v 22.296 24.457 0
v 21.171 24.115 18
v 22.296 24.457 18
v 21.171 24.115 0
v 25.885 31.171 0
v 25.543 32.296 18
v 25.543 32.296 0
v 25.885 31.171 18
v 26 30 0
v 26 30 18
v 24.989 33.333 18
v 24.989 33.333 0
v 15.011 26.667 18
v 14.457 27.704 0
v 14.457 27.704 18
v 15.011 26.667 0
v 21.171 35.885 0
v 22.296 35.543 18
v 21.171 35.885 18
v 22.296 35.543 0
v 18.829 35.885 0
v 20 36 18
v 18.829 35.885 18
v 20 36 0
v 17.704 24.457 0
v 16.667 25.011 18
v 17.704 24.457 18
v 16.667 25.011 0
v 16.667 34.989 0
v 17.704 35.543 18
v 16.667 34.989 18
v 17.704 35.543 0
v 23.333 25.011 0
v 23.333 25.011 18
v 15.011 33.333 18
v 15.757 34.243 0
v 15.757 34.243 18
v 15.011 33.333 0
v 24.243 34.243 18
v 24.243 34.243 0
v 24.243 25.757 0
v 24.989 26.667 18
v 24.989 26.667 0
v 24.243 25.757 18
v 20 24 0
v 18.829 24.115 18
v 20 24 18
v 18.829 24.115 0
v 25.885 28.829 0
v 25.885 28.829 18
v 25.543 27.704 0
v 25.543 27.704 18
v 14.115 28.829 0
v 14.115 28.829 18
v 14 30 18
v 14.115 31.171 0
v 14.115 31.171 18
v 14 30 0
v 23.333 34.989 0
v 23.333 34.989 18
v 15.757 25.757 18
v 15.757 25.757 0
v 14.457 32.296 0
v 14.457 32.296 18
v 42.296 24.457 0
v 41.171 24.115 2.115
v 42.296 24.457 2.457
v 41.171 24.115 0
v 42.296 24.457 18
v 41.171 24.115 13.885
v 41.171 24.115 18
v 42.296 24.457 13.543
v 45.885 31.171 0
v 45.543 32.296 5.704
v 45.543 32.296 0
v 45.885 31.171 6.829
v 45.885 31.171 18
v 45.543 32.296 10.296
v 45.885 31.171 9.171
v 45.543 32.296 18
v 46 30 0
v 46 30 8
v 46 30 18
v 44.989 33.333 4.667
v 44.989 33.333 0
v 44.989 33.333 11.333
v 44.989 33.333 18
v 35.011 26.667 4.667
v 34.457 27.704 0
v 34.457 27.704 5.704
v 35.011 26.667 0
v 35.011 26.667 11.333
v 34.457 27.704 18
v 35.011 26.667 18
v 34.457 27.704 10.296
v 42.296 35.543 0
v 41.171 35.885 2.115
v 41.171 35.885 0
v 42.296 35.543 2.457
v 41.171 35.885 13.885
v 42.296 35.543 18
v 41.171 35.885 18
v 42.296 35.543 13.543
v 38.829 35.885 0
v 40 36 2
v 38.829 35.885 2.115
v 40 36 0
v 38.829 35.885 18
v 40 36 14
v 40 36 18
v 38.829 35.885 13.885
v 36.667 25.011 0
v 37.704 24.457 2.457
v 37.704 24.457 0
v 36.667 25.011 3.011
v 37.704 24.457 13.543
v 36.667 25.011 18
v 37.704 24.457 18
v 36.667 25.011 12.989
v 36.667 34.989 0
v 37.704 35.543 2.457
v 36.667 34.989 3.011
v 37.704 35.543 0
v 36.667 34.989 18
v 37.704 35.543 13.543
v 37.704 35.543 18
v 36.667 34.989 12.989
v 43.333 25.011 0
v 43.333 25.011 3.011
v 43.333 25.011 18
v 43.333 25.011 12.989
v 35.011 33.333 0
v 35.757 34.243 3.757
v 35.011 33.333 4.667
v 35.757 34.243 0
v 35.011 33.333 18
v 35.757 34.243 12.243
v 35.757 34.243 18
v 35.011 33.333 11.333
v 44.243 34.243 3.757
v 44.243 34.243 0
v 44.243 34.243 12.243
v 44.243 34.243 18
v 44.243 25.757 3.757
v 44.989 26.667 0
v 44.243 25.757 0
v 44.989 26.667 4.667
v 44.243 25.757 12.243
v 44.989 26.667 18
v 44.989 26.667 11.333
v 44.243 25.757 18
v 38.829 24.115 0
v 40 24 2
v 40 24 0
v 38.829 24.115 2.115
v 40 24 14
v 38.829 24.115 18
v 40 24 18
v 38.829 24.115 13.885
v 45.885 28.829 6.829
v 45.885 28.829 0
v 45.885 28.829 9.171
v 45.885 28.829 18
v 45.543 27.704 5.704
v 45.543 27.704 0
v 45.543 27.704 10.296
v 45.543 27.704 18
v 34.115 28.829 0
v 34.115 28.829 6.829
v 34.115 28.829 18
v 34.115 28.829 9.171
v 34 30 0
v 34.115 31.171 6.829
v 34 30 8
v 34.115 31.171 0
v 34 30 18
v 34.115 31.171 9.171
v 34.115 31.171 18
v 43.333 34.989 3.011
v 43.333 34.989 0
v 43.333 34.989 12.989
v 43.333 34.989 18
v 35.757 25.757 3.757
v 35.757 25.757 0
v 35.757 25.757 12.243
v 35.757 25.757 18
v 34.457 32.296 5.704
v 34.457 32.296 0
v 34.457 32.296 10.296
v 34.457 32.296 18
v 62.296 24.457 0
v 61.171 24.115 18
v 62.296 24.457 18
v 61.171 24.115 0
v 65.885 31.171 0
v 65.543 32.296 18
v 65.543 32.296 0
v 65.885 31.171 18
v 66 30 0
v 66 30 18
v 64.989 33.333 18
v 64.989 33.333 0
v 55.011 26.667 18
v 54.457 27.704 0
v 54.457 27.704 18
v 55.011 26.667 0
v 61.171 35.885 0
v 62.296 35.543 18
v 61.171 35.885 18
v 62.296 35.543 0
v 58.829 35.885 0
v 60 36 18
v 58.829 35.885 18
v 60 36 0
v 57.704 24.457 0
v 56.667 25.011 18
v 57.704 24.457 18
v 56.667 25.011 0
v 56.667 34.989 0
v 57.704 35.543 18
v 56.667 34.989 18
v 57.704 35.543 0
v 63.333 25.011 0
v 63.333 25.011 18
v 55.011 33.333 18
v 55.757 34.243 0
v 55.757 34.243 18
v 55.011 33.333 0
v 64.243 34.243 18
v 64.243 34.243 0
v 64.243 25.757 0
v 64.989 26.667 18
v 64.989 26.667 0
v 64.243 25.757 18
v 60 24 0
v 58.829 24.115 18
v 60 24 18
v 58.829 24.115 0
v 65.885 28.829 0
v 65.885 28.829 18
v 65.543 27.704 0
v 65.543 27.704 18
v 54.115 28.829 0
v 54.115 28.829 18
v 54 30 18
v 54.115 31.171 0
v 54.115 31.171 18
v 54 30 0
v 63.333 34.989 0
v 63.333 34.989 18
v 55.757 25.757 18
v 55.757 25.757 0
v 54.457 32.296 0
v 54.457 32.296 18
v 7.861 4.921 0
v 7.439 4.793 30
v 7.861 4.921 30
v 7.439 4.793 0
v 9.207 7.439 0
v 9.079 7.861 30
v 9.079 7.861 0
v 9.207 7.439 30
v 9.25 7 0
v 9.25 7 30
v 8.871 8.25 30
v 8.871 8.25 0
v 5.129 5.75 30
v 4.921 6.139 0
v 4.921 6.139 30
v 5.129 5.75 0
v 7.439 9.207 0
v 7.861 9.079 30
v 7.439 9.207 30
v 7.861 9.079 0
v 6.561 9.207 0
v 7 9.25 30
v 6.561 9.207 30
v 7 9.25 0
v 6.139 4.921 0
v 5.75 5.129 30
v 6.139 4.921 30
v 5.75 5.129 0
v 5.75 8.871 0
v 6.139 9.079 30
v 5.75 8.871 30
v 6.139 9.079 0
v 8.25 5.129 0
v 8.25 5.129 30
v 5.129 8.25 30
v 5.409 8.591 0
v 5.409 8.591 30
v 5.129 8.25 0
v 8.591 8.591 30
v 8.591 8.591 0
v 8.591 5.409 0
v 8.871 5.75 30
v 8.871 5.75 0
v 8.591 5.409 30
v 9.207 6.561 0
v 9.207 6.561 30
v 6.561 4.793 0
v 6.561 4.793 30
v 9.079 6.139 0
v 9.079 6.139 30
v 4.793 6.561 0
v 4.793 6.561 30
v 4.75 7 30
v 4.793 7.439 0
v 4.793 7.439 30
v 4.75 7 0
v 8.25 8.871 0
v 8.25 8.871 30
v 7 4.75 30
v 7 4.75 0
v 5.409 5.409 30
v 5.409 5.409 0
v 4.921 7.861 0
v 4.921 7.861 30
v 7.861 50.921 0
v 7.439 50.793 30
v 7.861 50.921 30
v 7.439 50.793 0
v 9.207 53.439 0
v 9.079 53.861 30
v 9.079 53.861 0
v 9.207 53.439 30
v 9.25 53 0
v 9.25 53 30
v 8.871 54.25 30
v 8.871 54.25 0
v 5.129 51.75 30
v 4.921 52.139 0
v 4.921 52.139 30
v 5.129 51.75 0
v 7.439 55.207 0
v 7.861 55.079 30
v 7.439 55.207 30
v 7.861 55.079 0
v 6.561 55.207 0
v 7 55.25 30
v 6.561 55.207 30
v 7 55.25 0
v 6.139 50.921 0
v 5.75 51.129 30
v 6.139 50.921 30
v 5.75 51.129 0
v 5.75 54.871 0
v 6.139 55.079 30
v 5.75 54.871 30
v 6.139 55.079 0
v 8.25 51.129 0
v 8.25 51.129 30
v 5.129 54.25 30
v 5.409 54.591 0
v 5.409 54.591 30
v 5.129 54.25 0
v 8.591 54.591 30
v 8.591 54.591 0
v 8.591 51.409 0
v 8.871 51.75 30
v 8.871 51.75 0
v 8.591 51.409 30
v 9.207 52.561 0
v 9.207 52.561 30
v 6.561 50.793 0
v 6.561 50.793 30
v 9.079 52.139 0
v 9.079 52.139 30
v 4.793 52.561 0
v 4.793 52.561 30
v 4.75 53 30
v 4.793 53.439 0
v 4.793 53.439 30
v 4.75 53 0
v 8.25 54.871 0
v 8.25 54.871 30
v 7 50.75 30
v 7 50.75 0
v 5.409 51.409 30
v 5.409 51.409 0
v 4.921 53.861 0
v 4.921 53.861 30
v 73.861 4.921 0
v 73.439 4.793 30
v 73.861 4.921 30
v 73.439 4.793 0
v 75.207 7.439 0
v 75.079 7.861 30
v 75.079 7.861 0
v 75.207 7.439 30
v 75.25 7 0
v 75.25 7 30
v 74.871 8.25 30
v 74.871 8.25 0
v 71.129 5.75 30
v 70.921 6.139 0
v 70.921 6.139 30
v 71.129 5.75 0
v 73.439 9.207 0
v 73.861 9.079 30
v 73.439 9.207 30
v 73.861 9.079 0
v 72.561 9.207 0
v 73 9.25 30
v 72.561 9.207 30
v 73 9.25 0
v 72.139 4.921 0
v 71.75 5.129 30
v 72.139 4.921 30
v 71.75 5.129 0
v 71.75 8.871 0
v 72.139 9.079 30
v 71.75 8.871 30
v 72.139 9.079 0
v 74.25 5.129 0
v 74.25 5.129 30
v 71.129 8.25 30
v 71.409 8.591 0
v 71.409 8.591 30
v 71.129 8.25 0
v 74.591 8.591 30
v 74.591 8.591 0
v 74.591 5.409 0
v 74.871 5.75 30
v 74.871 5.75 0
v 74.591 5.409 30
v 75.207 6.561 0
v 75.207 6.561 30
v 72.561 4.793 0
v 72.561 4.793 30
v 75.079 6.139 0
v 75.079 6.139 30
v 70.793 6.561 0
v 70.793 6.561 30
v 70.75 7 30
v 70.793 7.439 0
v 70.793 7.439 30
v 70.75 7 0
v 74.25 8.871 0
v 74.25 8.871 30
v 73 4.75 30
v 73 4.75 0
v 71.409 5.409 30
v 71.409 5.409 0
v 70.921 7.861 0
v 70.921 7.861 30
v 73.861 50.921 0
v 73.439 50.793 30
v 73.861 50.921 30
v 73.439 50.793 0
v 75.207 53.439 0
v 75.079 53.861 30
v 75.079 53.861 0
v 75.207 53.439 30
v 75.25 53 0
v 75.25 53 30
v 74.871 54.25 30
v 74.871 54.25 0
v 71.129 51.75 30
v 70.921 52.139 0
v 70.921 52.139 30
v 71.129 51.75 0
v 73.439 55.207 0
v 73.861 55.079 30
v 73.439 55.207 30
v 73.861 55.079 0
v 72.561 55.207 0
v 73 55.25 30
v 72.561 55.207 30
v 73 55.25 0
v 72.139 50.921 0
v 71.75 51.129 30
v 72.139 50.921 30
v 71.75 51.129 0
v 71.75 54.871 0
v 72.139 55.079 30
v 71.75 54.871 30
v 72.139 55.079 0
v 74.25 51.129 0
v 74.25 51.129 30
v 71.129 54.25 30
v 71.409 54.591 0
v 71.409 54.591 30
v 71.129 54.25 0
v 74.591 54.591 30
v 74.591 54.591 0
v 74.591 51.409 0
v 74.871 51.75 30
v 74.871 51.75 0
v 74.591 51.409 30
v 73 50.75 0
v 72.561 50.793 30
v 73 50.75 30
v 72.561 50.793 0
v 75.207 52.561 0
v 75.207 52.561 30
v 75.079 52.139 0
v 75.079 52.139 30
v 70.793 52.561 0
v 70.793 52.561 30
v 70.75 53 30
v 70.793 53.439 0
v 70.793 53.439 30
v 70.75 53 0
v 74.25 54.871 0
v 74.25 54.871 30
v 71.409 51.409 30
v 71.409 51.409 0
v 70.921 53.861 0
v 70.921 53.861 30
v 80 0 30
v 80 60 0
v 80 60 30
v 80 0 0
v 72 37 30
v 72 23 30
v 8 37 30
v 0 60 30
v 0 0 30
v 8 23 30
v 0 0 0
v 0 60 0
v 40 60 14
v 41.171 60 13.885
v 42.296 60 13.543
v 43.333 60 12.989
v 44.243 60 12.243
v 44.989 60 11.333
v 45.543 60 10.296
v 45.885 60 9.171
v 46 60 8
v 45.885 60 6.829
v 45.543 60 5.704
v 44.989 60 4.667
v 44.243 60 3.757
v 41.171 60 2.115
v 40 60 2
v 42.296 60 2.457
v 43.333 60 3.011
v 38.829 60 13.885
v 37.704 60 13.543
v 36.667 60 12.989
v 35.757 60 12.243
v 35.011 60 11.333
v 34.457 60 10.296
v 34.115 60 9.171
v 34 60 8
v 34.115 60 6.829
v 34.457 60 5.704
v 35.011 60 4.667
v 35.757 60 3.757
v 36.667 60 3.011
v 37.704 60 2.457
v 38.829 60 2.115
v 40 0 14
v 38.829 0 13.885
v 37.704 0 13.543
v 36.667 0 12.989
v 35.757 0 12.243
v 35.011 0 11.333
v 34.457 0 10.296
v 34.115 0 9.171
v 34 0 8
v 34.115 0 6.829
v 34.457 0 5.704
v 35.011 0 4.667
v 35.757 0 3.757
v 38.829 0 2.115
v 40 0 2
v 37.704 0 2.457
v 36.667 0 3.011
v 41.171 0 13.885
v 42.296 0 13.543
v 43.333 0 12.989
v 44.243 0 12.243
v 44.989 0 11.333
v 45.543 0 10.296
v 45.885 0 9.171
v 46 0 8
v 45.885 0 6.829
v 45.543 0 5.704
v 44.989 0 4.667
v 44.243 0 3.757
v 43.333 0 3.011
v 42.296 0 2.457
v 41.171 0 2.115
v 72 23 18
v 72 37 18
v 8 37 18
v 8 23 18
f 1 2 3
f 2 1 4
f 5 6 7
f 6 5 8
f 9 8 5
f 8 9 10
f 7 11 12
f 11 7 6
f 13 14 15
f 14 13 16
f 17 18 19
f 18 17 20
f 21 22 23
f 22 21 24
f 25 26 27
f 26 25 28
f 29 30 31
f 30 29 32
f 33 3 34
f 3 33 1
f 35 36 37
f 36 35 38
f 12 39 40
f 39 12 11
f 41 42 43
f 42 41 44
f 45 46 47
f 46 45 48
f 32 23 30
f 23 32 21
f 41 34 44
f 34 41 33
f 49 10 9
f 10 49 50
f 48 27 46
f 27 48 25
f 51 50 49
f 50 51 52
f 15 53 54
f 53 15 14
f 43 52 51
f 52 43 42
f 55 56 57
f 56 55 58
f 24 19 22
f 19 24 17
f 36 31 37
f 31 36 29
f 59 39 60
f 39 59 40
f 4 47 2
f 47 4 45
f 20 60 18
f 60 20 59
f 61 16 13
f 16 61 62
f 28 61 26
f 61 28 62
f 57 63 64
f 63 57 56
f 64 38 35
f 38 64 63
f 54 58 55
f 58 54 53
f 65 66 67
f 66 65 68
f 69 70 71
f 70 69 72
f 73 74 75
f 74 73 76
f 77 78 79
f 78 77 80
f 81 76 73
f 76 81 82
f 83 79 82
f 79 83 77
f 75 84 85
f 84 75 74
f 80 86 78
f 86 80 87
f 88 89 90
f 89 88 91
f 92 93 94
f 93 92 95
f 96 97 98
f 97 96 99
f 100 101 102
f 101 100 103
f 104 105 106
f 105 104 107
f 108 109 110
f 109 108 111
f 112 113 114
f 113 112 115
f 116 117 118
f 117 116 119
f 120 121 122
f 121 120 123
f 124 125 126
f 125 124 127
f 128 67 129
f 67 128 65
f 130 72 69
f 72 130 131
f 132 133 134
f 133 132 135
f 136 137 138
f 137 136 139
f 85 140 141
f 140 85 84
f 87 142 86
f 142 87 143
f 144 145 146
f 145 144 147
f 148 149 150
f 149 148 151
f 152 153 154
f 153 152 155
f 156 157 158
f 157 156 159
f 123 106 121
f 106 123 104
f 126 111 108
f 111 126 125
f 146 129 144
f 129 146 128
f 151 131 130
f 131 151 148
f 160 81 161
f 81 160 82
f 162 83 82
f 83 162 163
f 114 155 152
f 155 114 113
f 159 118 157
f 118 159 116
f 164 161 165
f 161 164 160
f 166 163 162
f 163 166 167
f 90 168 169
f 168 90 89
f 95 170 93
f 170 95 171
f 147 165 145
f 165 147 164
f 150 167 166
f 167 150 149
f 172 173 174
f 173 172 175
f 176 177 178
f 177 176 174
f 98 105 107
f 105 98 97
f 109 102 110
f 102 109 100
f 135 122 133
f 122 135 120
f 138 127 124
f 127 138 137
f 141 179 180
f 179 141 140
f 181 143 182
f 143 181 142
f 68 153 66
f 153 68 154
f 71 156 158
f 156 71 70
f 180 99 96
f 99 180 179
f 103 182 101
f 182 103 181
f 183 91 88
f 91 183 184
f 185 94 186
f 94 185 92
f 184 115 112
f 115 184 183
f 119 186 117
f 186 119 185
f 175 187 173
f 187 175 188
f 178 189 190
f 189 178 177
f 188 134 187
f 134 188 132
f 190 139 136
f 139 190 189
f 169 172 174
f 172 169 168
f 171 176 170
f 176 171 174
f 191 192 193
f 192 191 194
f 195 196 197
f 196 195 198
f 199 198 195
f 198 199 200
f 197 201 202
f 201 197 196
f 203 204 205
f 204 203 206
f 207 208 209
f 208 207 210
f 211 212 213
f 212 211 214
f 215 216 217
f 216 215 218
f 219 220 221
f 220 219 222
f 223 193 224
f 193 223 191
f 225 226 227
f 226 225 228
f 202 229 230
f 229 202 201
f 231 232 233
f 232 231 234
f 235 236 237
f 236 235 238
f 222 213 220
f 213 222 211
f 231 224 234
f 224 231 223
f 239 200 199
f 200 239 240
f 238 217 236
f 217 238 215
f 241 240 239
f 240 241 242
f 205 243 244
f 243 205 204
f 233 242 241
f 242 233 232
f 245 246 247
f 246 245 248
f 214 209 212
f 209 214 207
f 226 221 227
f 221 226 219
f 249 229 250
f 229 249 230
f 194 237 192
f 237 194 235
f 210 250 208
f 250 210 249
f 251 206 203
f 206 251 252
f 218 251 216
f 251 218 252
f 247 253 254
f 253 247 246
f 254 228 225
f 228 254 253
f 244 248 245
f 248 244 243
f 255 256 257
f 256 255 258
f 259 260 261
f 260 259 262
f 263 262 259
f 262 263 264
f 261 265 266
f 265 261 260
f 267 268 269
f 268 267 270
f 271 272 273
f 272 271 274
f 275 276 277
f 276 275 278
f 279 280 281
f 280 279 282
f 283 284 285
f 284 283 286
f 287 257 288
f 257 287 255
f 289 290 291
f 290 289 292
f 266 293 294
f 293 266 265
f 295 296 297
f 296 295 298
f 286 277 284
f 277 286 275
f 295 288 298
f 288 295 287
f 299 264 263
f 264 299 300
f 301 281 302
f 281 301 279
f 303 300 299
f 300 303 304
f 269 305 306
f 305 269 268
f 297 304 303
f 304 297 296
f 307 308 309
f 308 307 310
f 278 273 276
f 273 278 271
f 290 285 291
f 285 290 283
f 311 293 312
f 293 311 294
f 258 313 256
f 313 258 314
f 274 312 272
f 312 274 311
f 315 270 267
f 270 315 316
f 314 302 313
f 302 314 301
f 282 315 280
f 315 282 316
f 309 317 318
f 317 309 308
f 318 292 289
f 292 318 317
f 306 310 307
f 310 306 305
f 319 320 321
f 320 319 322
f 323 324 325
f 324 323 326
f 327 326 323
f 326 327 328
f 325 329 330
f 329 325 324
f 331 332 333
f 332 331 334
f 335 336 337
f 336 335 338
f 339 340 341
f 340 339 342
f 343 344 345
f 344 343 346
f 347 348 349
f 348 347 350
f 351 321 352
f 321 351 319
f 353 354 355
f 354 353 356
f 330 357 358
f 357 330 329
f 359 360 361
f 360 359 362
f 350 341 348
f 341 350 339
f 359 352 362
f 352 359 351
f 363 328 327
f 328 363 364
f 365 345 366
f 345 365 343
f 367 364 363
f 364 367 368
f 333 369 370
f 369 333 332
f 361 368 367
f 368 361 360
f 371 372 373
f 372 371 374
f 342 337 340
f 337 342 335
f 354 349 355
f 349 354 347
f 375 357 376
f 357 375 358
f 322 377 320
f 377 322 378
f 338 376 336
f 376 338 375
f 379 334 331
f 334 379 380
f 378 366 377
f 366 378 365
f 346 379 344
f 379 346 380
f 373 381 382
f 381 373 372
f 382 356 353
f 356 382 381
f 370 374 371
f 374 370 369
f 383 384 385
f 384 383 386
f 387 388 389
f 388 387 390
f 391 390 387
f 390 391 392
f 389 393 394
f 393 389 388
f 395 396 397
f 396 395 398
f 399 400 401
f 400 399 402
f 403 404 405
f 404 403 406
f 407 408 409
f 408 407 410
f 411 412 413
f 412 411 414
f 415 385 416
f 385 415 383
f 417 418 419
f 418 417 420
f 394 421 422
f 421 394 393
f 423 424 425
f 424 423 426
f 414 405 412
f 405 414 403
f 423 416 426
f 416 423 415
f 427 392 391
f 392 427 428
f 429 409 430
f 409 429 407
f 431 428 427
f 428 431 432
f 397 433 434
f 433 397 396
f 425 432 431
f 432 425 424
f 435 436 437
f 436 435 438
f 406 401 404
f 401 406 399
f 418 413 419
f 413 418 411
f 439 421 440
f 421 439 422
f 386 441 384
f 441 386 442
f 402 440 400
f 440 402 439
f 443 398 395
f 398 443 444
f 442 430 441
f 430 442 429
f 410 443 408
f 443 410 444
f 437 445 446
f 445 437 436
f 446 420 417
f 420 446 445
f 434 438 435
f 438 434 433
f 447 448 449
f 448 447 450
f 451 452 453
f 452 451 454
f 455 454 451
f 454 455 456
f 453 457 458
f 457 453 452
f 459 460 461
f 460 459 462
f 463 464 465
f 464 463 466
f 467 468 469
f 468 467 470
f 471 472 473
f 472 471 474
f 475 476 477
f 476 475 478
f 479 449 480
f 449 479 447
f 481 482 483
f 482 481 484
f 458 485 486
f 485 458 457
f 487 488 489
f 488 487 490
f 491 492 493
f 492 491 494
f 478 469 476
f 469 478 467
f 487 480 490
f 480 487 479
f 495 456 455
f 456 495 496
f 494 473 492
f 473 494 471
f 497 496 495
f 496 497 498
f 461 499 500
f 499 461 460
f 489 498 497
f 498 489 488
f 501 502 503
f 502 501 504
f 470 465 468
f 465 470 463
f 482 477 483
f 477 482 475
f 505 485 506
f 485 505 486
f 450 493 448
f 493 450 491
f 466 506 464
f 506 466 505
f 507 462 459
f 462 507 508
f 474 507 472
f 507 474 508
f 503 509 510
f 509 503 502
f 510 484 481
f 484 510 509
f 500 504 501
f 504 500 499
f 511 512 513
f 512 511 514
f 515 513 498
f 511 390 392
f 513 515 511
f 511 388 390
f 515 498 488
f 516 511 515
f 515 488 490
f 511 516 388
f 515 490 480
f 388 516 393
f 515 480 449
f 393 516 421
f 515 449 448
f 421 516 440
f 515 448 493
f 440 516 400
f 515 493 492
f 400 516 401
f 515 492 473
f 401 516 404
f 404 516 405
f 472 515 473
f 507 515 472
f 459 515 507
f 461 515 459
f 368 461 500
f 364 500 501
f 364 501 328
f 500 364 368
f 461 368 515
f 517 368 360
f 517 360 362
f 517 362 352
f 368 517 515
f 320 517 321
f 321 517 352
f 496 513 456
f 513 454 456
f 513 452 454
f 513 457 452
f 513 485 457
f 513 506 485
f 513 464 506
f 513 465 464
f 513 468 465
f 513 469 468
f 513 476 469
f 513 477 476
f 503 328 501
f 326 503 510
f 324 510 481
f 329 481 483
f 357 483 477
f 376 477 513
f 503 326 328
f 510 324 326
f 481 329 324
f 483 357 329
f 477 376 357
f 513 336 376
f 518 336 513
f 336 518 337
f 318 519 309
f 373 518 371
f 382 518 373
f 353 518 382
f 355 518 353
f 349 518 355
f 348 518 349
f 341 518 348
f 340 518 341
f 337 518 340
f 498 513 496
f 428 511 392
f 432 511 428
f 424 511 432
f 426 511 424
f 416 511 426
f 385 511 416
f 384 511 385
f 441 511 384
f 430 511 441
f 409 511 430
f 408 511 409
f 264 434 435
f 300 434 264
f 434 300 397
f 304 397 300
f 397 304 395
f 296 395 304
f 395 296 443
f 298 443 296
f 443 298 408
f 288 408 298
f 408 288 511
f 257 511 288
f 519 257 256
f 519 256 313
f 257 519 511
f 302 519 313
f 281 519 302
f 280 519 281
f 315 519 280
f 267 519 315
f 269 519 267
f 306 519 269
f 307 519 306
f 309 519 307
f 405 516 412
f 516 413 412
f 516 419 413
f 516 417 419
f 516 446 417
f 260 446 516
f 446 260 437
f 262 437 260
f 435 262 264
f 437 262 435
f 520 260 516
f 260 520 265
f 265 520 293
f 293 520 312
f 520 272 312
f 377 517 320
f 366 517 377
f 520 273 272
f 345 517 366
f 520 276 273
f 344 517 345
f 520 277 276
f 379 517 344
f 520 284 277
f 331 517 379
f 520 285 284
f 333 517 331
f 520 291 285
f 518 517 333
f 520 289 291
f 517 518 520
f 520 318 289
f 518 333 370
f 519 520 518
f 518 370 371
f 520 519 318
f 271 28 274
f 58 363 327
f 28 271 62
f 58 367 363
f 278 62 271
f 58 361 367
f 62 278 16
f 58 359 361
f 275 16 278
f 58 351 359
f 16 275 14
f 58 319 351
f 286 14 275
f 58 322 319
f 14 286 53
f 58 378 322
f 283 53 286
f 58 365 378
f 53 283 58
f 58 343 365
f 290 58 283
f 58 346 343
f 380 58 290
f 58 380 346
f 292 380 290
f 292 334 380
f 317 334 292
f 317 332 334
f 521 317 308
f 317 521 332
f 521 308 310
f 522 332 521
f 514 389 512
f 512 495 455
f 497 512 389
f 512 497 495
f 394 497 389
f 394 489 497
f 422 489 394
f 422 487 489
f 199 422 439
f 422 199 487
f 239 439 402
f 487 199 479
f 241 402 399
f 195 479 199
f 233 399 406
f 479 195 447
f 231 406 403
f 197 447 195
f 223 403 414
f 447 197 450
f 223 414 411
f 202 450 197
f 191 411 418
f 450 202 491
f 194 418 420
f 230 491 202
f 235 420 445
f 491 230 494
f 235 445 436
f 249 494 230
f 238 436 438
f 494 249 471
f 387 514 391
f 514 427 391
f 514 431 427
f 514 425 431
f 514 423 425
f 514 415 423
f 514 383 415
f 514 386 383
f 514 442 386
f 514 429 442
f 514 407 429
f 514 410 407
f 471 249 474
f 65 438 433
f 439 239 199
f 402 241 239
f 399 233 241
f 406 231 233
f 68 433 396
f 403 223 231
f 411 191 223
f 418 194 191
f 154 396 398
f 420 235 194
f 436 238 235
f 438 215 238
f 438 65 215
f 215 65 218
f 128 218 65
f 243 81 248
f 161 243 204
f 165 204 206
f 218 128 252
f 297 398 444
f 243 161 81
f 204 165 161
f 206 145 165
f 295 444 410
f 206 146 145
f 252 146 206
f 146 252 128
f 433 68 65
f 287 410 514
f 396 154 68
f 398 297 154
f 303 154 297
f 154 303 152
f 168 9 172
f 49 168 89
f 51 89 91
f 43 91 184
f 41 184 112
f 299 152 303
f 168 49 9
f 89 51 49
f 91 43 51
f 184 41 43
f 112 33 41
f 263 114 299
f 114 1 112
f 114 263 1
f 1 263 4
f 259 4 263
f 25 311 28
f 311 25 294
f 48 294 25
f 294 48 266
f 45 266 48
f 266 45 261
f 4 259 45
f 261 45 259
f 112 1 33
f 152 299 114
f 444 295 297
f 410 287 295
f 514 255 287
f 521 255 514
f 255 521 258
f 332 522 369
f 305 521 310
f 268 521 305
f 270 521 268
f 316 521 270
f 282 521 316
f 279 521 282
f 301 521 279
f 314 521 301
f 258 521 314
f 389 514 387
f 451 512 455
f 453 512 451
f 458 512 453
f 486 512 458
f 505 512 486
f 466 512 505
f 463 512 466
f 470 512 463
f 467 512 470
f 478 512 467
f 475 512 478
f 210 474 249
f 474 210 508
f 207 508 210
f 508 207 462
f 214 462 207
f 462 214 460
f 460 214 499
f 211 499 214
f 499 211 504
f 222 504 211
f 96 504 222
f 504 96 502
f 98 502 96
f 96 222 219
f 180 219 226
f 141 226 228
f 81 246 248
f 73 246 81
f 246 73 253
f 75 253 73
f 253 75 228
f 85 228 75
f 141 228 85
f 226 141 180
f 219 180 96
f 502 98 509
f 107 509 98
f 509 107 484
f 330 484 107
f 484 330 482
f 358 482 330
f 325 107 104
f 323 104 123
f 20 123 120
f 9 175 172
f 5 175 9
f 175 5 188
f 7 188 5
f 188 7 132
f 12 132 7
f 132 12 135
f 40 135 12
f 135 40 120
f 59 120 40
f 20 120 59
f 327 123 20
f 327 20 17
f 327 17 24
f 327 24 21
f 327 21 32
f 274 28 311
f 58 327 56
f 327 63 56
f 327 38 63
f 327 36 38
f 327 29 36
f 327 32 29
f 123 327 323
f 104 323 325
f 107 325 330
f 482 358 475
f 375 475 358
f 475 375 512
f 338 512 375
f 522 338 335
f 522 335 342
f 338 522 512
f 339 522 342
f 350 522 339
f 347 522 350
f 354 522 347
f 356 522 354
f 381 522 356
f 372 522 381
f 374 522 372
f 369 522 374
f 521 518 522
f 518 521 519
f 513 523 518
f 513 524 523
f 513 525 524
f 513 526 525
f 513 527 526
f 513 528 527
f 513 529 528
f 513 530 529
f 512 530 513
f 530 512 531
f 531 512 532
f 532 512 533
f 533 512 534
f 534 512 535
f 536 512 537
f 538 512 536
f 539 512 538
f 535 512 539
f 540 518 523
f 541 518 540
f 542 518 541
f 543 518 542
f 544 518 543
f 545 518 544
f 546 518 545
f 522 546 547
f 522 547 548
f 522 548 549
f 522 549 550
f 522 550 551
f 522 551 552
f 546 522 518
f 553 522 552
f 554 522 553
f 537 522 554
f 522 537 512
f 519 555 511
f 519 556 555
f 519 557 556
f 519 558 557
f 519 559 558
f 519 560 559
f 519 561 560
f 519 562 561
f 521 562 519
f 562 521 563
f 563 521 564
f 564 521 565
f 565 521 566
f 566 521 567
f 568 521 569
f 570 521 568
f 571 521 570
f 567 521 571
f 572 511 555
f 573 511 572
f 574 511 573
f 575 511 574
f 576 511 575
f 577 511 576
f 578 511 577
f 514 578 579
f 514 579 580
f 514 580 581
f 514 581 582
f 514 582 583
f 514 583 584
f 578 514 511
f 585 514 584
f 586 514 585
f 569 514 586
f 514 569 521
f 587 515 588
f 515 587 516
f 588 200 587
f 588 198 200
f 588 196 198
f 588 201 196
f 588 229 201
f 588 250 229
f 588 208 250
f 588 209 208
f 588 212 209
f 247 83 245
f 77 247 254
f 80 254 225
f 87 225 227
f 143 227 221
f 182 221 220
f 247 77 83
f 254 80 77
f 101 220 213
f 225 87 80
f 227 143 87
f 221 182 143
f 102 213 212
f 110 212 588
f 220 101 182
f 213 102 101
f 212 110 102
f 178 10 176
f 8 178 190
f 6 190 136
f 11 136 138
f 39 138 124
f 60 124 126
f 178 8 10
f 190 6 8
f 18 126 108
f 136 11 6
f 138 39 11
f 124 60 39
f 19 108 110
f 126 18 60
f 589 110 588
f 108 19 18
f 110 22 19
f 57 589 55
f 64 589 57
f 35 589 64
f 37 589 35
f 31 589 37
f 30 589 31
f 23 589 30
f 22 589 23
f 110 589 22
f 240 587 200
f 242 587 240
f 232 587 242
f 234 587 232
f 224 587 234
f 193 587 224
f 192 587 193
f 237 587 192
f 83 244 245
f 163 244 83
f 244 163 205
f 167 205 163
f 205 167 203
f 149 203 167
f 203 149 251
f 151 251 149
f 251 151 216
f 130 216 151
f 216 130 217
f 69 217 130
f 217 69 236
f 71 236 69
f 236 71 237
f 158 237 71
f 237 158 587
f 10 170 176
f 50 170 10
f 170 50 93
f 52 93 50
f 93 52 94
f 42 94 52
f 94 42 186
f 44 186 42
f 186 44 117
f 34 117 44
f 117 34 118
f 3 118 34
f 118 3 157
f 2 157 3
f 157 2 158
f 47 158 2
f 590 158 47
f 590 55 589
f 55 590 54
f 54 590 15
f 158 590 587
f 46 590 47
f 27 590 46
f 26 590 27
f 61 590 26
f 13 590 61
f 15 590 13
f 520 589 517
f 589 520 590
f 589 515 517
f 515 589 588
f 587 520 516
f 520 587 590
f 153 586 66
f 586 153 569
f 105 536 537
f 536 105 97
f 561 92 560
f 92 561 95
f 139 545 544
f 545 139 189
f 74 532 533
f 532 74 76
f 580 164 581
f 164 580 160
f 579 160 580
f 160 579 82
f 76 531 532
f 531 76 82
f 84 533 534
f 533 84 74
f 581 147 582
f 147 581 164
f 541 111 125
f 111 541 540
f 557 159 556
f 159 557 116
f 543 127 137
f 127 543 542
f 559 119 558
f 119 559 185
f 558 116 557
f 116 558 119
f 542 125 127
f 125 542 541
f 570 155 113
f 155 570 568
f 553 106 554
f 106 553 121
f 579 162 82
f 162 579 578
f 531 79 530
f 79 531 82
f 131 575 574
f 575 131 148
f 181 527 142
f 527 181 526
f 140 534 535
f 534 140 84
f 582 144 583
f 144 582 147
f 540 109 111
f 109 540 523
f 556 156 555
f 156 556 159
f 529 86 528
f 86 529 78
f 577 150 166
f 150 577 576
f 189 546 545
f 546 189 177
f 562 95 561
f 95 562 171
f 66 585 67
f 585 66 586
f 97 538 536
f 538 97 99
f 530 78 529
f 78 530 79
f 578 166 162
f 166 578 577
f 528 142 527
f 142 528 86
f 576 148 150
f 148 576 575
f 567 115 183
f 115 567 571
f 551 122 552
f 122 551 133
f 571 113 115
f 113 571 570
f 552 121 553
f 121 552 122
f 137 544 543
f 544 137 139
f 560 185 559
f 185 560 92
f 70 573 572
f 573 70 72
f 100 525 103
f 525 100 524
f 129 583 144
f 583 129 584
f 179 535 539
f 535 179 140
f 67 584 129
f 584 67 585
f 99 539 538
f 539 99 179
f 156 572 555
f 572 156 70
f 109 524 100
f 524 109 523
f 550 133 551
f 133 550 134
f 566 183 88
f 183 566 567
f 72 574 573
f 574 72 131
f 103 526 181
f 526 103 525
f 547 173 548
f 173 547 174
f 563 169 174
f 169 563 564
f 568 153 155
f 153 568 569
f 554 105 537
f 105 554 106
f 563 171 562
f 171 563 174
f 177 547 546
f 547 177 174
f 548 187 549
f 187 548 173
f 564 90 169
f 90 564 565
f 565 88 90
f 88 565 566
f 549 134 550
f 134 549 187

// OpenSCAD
$fn = 32;

// ----------------------------------------------------------------------
// Manifold block: side_outlet manifold
// ----------------------------------------------------------------------

// --- parameters (mm) ---
block_l = 80;             // block length, X
block_w = 60;             // block width, Y
block_h = 30;             // block height, Z
port_d = 12;              // port bore diameter
port_pitch = 20;          // port pitch along X
gallery_d = 14;           // top gallery width, Y
gallery_depth = 12;       // gallery pocket depth
wall_p = 8;               // gallery end wall thickness, X
mnt_d = 4.5;              // mounting hole diameter
mnt_in = 7;               // mounting hole inset from the edges
out_d = 12;               // outlet bore diameter
out_z = 8;                // outlet axis height

n_ports = 3;  // ports in the row
port_x0 = (block_l - (n_ports - 1) * port_pitch) / 2;  // first port X

difference() {
  cube([block_l, block_w, block_h]);
  for (i = [0 : n_ports - 1])
    translate([port_x0 + i * port_pitch, block_w / 2, -1])
      cylinder(h = block_h + 2, d = port_d);
  translate([wall_p, block_w / 2 - gallery_d / 2, block_h - gallery_depth])
    cube([block_l - 2 * wall_p, gallery_d, gallery_depth + 1]);
  for (cx = [mnt_in, block_l - mnt_in])
    for (cy = [mnt_in, block_w - mnt_in])
      translate([cx, cy, -1]) cylinder(h = block_h + 2, d = mnt_d);
  translate([block_l / 2, -1, out_z]) rotate([-90, 0, 0])
    cylinder(h = block_w + 2, d = out_d);
}
